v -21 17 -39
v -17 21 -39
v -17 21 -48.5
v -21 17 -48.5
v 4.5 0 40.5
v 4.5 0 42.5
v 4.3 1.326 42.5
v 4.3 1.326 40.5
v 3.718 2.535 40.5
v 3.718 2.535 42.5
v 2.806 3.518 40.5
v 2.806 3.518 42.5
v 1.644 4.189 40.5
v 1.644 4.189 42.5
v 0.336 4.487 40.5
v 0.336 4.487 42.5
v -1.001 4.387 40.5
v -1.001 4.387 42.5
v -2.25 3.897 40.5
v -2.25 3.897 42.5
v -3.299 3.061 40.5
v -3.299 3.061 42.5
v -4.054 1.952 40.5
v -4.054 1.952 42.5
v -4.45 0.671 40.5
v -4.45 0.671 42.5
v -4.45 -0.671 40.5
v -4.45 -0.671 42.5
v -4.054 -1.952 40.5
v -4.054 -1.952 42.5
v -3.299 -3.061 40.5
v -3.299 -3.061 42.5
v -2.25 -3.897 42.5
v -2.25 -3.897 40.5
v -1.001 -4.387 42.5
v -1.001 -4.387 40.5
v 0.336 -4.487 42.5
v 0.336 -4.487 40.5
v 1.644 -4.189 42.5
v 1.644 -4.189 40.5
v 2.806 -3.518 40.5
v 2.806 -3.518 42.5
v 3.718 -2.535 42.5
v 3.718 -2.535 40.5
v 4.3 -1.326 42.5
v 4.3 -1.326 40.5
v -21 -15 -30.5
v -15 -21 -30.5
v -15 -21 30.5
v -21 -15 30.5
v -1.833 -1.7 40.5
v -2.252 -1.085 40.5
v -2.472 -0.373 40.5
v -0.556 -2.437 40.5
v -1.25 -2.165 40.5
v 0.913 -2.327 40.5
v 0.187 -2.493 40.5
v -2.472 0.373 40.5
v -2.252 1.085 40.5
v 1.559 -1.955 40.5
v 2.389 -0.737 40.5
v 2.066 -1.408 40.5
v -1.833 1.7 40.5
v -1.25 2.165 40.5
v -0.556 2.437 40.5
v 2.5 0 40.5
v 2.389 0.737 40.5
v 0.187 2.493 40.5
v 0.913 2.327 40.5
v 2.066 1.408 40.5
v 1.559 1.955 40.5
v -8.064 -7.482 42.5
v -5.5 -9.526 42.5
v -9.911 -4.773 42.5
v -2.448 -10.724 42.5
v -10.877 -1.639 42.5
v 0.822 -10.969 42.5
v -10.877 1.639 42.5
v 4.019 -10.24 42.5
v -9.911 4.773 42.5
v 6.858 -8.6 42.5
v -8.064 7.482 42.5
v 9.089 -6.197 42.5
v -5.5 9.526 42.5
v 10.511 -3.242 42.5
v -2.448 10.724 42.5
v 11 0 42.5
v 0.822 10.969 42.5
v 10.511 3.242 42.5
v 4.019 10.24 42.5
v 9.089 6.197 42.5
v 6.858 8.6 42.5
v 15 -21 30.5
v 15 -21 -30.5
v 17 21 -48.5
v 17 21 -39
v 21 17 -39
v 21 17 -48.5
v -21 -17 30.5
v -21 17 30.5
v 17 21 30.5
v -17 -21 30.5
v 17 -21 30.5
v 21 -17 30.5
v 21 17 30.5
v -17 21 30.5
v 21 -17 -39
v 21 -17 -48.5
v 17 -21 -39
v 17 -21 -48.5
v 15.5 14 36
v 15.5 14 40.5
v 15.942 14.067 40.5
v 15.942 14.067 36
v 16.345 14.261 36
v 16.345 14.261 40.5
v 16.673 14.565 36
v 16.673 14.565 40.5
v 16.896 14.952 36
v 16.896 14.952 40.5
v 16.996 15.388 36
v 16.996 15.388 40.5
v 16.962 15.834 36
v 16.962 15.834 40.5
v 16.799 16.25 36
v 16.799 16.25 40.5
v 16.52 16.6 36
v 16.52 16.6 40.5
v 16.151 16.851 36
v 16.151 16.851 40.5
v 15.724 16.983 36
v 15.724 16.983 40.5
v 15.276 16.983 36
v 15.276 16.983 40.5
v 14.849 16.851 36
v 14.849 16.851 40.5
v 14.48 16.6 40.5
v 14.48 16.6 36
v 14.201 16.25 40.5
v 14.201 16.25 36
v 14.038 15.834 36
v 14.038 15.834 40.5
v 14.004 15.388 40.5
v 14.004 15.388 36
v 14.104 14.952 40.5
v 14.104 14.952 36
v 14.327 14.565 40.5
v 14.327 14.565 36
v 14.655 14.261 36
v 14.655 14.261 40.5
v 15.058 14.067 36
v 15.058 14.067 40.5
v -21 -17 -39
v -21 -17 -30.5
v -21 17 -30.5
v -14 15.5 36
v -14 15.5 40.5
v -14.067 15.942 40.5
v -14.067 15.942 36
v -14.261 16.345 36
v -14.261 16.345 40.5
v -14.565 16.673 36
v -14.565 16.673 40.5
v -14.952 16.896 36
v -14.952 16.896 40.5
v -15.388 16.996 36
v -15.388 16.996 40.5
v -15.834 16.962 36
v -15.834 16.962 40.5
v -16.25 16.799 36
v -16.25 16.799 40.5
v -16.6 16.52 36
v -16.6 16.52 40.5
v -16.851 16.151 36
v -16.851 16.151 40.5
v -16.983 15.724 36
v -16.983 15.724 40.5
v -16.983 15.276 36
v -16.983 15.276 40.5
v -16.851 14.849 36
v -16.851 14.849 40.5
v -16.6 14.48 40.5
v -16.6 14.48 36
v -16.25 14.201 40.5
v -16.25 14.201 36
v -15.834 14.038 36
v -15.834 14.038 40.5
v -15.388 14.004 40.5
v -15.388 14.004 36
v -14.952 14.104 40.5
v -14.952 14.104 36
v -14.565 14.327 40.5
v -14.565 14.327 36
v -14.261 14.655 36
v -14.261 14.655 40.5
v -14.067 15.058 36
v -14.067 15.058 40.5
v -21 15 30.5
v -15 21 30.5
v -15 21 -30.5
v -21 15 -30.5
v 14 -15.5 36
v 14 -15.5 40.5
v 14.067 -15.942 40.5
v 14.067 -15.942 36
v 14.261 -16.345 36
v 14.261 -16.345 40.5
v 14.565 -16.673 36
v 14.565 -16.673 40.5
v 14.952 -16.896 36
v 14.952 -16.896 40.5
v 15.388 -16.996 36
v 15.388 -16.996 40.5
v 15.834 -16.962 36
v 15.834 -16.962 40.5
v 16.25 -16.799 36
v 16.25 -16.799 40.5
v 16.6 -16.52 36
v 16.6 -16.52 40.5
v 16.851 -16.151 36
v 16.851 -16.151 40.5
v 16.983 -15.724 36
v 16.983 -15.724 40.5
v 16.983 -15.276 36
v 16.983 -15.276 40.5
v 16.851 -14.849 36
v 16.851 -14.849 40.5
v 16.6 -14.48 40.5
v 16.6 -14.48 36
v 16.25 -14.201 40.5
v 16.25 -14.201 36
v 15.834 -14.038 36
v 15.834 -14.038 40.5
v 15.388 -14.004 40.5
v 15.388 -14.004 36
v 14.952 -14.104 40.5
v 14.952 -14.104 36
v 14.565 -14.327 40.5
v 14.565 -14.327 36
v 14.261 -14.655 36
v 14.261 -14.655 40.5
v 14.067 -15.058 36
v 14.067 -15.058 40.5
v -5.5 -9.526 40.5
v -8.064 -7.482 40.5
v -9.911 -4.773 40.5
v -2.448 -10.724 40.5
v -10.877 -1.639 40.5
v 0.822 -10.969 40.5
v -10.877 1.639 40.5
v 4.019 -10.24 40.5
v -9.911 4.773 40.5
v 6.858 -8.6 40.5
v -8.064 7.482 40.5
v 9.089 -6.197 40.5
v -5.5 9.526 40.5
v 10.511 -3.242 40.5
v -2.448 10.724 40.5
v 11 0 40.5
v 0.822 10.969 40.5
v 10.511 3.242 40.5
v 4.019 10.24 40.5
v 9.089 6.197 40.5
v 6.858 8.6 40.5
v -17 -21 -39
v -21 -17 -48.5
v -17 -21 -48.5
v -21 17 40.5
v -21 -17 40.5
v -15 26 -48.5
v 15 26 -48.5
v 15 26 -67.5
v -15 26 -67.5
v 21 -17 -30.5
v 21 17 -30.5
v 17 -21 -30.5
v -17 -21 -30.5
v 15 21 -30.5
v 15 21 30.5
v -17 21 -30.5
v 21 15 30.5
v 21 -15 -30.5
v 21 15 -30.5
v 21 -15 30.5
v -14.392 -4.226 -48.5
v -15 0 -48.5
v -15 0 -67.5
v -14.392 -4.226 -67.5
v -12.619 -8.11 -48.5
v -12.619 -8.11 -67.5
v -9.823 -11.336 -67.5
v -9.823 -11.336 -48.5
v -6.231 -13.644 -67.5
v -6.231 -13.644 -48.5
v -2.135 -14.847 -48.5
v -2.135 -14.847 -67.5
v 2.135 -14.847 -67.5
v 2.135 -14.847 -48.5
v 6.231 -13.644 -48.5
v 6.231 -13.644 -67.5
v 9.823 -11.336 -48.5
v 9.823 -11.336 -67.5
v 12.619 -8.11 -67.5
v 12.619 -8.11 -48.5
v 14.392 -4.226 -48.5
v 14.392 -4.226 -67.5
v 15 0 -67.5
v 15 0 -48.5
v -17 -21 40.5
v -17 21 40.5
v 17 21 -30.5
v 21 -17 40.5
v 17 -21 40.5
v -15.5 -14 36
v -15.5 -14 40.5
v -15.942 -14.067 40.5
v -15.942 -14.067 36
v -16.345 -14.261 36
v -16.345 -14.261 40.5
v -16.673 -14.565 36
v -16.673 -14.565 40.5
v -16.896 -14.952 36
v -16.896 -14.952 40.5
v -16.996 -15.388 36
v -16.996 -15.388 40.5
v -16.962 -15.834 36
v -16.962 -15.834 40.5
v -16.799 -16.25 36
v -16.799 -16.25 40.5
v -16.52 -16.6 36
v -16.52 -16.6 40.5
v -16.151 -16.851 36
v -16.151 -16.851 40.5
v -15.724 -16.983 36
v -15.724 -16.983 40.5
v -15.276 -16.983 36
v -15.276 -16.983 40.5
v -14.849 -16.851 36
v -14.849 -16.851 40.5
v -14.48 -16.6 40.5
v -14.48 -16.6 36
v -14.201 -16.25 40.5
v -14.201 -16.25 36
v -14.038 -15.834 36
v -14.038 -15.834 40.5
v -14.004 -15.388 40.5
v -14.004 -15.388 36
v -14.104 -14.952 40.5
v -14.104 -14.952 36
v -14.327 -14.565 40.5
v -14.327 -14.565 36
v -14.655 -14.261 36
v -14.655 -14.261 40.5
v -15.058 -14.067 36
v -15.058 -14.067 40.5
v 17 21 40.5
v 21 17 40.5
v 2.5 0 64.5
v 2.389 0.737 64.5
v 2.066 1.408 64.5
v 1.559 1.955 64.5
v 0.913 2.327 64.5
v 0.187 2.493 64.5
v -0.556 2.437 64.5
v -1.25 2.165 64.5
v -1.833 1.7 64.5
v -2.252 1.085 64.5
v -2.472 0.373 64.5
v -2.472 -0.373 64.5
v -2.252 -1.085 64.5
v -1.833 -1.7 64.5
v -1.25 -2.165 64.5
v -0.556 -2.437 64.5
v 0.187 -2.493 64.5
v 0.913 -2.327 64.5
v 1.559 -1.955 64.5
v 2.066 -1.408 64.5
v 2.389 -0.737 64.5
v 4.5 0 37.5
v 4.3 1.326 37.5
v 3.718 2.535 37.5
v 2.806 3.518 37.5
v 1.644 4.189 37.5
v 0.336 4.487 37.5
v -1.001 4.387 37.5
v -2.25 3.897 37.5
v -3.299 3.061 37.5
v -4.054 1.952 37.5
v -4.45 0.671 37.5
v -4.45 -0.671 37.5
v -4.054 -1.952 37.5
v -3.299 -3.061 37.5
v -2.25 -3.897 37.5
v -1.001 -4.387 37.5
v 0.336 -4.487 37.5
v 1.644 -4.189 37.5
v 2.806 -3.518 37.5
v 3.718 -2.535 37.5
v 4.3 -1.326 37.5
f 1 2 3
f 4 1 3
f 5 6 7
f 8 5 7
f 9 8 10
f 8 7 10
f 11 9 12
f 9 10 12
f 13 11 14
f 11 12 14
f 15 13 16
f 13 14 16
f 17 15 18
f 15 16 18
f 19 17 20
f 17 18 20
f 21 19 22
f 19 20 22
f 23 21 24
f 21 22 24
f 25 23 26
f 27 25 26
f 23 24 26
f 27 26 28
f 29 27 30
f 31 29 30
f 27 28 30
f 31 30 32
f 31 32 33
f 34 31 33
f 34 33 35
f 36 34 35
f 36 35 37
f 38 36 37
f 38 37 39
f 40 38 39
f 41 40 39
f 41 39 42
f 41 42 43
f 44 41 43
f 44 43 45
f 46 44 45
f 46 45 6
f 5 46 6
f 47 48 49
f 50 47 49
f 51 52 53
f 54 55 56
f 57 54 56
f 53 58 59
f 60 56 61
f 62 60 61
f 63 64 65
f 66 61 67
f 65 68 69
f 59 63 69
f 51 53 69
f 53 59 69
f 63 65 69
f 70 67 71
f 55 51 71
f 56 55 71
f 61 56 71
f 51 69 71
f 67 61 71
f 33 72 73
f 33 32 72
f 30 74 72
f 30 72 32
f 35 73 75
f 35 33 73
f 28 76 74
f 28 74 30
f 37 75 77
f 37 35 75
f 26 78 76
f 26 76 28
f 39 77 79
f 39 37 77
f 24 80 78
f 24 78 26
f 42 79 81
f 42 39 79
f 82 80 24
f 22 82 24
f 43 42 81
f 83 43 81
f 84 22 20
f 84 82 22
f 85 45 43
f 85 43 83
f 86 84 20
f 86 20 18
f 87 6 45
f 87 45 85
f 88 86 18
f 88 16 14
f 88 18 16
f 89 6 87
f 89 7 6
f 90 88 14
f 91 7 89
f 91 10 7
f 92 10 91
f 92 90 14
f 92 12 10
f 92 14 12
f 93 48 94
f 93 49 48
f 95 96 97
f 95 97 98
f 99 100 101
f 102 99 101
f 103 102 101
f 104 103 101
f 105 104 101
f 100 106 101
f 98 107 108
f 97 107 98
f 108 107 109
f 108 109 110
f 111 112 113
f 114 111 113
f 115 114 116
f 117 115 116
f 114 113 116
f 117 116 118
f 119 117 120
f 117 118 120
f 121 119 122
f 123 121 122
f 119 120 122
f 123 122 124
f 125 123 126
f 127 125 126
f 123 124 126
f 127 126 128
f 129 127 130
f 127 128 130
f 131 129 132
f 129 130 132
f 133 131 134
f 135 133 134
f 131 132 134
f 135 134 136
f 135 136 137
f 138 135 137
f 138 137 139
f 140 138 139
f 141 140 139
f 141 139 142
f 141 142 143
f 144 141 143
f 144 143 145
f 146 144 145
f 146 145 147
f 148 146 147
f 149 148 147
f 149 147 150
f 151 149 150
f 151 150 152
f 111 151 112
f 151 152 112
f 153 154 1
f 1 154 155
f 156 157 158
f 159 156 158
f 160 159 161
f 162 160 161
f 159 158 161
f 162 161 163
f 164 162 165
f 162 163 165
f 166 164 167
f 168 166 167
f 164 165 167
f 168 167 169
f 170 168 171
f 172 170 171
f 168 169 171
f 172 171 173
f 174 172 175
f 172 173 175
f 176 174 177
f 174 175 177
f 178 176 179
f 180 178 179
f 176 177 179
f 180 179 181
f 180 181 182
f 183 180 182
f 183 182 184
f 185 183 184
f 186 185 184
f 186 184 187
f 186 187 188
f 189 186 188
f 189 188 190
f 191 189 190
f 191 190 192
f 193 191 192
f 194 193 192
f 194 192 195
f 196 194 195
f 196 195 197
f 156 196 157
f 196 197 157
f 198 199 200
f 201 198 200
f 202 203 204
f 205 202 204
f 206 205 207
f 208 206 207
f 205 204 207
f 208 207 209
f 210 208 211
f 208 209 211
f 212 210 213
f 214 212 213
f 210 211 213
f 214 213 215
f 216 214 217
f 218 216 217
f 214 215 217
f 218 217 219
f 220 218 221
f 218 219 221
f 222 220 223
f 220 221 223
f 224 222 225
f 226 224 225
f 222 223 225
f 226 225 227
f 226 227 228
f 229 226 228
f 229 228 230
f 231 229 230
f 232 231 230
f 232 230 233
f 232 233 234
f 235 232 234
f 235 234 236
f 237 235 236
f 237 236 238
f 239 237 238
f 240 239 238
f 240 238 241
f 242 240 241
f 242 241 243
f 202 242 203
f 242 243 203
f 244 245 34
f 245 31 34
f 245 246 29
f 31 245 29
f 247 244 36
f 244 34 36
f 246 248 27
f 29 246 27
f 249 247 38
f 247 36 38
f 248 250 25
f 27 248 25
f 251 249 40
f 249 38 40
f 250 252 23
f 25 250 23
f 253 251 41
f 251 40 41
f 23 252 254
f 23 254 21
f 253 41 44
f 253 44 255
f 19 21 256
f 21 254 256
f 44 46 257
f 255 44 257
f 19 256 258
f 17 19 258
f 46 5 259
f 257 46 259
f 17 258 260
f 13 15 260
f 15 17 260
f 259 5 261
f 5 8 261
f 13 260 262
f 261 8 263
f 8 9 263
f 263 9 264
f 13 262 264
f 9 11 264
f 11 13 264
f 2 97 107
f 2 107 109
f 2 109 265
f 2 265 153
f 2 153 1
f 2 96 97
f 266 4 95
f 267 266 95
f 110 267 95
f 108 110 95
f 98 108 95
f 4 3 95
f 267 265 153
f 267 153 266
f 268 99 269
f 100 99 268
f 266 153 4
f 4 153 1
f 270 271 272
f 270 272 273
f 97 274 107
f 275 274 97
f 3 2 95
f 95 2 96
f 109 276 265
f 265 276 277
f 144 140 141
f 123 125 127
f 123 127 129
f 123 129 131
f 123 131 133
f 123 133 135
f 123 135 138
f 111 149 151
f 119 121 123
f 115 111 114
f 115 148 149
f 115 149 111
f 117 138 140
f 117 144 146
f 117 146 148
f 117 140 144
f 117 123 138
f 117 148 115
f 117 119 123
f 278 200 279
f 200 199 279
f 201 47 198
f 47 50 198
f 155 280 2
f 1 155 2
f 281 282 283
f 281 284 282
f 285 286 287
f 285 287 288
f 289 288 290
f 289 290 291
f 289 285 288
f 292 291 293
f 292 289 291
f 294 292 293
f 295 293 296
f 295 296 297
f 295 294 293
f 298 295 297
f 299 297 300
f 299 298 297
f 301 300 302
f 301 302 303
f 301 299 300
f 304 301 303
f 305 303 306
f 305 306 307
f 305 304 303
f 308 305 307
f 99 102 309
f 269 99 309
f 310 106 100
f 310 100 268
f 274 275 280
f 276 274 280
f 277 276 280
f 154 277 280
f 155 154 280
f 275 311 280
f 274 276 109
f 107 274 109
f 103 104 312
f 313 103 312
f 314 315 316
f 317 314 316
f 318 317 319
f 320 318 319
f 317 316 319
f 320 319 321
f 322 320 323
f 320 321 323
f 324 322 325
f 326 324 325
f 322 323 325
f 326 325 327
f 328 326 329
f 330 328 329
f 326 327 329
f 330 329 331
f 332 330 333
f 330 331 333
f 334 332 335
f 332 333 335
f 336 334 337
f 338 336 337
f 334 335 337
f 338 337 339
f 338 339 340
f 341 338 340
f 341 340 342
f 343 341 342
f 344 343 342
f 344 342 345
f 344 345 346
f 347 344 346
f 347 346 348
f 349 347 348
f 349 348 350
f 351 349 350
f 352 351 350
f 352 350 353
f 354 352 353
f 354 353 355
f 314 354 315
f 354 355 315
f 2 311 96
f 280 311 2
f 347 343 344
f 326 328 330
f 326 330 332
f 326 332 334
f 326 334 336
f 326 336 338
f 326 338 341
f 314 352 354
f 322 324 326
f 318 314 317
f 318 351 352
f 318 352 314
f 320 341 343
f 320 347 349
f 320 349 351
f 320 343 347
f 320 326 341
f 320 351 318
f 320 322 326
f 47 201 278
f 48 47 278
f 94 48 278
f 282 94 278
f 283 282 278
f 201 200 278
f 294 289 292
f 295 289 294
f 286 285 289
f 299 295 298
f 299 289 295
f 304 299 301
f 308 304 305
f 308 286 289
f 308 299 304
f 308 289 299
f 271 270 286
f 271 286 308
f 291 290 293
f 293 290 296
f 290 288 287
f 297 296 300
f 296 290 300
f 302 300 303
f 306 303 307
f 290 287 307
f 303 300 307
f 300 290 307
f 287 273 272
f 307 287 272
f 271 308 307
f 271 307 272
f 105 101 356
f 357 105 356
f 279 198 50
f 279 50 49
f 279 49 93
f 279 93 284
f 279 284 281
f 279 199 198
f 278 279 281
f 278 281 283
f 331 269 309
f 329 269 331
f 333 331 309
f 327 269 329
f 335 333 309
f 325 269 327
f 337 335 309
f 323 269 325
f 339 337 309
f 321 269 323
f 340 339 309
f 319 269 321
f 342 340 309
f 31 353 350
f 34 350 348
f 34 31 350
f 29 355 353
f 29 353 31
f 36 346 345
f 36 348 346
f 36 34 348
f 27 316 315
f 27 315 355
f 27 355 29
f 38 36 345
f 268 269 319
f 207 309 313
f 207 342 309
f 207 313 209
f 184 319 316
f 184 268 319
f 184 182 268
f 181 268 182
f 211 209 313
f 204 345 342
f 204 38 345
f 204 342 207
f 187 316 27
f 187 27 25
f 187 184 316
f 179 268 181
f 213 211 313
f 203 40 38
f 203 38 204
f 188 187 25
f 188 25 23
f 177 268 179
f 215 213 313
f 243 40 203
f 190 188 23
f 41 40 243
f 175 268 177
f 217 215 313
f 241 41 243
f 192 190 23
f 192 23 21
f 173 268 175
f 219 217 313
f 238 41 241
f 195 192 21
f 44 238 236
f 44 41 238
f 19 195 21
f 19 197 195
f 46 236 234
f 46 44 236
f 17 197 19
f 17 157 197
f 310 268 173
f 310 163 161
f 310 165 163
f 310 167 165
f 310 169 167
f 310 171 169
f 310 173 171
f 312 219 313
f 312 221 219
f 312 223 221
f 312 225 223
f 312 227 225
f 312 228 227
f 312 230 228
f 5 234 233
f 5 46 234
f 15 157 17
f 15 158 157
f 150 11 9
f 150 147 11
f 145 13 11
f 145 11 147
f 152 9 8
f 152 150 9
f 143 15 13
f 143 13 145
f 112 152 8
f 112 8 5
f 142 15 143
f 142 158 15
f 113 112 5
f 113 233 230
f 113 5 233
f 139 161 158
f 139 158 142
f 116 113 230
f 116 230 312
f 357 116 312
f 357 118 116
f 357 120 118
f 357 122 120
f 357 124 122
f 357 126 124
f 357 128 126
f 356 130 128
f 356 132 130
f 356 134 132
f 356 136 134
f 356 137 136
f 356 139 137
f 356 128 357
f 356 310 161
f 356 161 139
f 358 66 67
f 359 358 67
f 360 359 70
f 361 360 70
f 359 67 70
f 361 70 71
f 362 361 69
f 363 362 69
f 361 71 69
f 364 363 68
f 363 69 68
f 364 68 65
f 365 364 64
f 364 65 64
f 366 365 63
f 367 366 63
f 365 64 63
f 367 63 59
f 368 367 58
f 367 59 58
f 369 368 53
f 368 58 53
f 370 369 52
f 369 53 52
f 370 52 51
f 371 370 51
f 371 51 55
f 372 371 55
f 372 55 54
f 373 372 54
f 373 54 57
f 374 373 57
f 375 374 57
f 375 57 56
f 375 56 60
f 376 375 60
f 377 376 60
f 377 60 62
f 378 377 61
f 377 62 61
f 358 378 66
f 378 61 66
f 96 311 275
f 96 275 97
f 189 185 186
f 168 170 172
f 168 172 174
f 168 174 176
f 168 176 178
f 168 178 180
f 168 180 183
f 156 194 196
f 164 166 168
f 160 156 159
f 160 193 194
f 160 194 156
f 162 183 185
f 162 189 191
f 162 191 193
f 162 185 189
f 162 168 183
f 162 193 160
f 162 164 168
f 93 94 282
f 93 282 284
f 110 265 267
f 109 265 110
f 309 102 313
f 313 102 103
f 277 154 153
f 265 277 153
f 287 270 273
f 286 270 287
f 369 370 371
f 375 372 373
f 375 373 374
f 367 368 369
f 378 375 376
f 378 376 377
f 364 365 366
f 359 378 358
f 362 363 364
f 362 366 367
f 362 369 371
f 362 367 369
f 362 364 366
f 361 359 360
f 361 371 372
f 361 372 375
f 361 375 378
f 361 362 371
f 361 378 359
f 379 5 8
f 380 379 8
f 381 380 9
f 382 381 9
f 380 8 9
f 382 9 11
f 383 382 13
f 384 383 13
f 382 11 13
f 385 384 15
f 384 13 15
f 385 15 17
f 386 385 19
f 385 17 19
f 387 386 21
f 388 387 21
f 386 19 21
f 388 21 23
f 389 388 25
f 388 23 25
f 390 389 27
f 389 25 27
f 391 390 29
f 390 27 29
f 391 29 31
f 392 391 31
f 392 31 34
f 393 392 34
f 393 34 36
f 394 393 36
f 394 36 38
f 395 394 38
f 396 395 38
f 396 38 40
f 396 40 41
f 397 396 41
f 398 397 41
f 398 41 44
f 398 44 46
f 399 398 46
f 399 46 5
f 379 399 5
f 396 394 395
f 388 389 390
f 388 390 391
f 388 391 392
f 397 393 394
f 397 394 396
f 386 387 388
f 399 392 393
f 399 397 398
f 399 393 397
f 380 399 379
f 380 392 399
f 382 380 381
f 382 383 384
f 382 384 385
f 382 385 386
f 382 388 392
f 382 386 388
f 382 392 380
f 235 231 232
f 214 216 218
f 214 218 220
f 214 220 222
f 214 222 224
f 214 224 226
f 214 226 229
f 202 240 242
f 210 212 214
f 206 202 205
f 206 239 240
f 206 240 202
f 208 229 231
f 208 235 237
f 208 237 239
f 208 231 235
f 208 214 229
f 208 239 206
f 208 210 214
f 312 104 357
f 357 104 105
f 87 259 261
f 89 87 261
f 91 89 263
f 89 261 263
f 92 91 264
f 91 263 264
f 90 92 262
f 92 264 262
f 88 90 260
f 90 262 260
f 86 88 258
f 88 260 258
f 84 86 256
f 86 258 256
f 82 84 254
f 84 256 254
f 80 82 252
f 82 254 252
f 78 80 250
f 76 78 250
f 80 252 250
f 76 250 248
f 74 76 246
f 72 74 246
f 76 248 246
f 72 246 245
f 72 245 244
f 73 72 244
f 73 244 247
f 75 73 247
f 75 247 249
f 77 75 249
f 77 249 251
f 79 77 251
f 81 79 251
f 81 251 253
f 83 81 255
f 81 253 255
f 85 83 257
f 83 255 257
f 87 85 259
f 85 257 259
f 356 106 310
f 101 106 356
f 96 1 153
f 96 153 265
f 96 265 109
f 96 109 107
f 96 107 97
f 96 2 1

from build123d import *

# Parameters (mm, degrees)
SKETCH_1_W               = 42
SKETCH_1_H               = 42
EXTRUDE_1_DEPTH          = 30.5
CHAMFER_1_SIZE           = 6
SKETCH_15_W              = 42
SKETCH_15_H              = 42
EXTRUDE_11_DEPTH         = 10
SKETCH_16_W              = 42
SKETCH_16_H              = 42
EXTRUDE_12_DEPTH         = 8.5
SKETCH_17_W              = 42
SKETCH_17_H              = 42
EXTRUDE_13_DEPTH         = 9.5
CHAMFER_2_SIZE           = 4
CHAMFER_3_SIZE           = 4
CHAMFER_4_SIZE           = 4
SKETCH_2_R               = 11
EXTRUDE_2_DEPTH          = 2
SKETCH_3_R               = 4.5
CUT_EXTRUDE_1_DEPTH      = 5
SKETCH_6_R               = 2.5
EXTRUDE_9_DEPTH          = 24
EXTRUDE_10_DEPTH         = 19
SKETCH_8_R               = 1.5
CUT_EXTRUDE_3_DEPTH      = 4.5
PATTERN_CIRCULAR_1_COUNT = 4


with BuildPart() as part:
    # 草圖1 → 填料-伸長1 (new body, symmetric)
    with BuildSketch(Plane.XY):
        Rectangle(SKETCH_1_W, SKETCH_1_H)
    extrude(amount=EXTRUDE_1_DEPTH, both=True)

    # 導角1
    chamfer_1_edges = [part.edges().sort_by_distance(p)[0] for p in [
        (21, -21, 0),
        (-21, -21, 0),
        (-21, 21, 0),
        (21, 21, 0),
    ]]
    chamfer(chamfer_1_edges, length=CHAMFER_1_SIZE)


with BuildPart() as body_2:
    # 草圖15 → 填料-伸長11 (new body)
    with BuildSketch(Plane.XY.offset(30.5)):
        Rectangle(SKETCH_15_W, SKETCH_15_H)
    extrude(amount=EXTRUDE_11_DEPTH)

    # 導角2
    chamfer_2_edges = [body_2.edges().sort_by_distance(p)[0] for p in [
        (21, -21, 35.5),
        (-21, -21, 35.5),
        (-21, 21, 35.5),
        (21, 21, 35.5),
    ]]
    chamfer(chamfer_2_edges, length=CHAMFER_2_SIZE)


with BuildPart() as body_3:
    # 草圖16 → 填料-伸長12 (new body)
    with BuildSketch(Plane(origin=(0, 0, -30.5), x_dir=(-1, 0, 0), z_dir=(0, 0, -1))):
        Rectangle(SKETCH_16_W, SKETCH_16_H)
    extrude(amount=EXTRUDE_12_DEPTH)

    # 導角3
    chamfer_3_edges = [body_3.edges().sort_by_distance(p)[0] for p in [
        (-21, -21, -34.75),
        (21, -21, -34.75),
        (21, 21, -34.75),
        (-21, 21, -34.75),
    ]]
    chamfer(chamfer_3_edges, length=CHAMFER_3_SIZE)


with BuildPart() as body_4:
    # 草圖17 → 填料-伸長13 (new body)
    with BuildSketch(Plane.XY.offset(-39)):
        Rectangle(SKETCH_17_W, SKETCH_17_H)
    extrude(amount=-EXTRUDE_13_DEPTH)

    # 導角4
    chamfer_4_edges = [body_4.edges().sort_by_distance(p)[0] for p in [
        (21, -21, -43.75),
        (-21, -21, -43.75),
        (-21, 21, -43.75),
        (21, 21, -43.75),
    ]]
    chamfer(chamfer_4_edges, length=CHAMFER_4_SIZE)


with BuildPart() as body_5:
    # 草圖2 → 填料-伸長2 (new body)
    with BuildSketch(Plane.XY.offset(40.5)):
        Circle(SKETCH_2_R)
    extrude(amount=EXTRUDE_2_DEPTH)


with BuildPart() as cut_extrude_1_tool:
    # 草圖3 → 除料-伸長1 (new body)
    with BuildSketch(Plane.XY.offset(42.5)):
        Circle(SKETCH_3_R)
    extrude(amount=-CUT_EXTRUDE_1_DEPTH)


with BuildPart() as body_2_1:
    add(body_2.part)

    # 除料-伸長1: cut by cut_extrude_1_tool
    add(cut_extrude_1_tool.part, mode=Mode.SUBTRACT)

    # 草圖8 → 除料-伸長3 (cut)
    with BuildSketch(Plane.XY.offset(40.5)):
        with Locations((-15.5, 15.5)):
            Circle(SKETCH_8_R)
    cut_extrude_3 = extrude(amount=-CUT_EXTRUDE_3_DEPTH, mode=Mode.SUBTRACT)

    # 環狀複製排列1: 除料-伸長3 ×4 about axis
    pattern_circular_1_axis = Axis((0, 0, 0), (0, 0, 1))
    for i in range(1, PATTERN_CIRCULAR_1_COUNT):
        add(cut_extrude_3.rotate(pattern_circular_1_axis, i * 360 / PATTERN_CIRCULAR_1_COUNT), mode=Mode.SUBTRACT)


with BuildPart() as body_5_1:
    add(body_5.part)

    # 除料-伸長1: cut by cut_extrude_1_tool
    add(cut_extrude_1_tool.part, mode=Mode.SUBTRACT)


with BuildPart() as body_6:
    # 草圖6 → 填料-伸長9 (new body)
    with BuildSketch(Plane.XY.offset(40.5)):
        Circle(SKETCH_6_R)
    extrude(amount=EXTRUDE_9_DEPTH)


with BuildPart() as body_7:
    # 草圖9 → 填料-伸長10 (new body)
    with BuildSketch(Plane(origin=(0, 0, -48.5), x_dir=(-1, 0, 0), z_dir=(0, 0, -1))):
        with BuildLine():
            Line((-15, 0), (-15, 26))
            Line((-15, 26), (15, 26))
            Line((15, 26), (15, 0))
            ThreePointArc((15, 0), (0, -15), (-15, 0))
        make_face()
    extrude(amount=EXTRUDE_10_DEPTH)


solid = Compound([part.part, body_3.part, body_4.part, body_2_1.part, body_5_1.part, body_6.part, body_7.part])
